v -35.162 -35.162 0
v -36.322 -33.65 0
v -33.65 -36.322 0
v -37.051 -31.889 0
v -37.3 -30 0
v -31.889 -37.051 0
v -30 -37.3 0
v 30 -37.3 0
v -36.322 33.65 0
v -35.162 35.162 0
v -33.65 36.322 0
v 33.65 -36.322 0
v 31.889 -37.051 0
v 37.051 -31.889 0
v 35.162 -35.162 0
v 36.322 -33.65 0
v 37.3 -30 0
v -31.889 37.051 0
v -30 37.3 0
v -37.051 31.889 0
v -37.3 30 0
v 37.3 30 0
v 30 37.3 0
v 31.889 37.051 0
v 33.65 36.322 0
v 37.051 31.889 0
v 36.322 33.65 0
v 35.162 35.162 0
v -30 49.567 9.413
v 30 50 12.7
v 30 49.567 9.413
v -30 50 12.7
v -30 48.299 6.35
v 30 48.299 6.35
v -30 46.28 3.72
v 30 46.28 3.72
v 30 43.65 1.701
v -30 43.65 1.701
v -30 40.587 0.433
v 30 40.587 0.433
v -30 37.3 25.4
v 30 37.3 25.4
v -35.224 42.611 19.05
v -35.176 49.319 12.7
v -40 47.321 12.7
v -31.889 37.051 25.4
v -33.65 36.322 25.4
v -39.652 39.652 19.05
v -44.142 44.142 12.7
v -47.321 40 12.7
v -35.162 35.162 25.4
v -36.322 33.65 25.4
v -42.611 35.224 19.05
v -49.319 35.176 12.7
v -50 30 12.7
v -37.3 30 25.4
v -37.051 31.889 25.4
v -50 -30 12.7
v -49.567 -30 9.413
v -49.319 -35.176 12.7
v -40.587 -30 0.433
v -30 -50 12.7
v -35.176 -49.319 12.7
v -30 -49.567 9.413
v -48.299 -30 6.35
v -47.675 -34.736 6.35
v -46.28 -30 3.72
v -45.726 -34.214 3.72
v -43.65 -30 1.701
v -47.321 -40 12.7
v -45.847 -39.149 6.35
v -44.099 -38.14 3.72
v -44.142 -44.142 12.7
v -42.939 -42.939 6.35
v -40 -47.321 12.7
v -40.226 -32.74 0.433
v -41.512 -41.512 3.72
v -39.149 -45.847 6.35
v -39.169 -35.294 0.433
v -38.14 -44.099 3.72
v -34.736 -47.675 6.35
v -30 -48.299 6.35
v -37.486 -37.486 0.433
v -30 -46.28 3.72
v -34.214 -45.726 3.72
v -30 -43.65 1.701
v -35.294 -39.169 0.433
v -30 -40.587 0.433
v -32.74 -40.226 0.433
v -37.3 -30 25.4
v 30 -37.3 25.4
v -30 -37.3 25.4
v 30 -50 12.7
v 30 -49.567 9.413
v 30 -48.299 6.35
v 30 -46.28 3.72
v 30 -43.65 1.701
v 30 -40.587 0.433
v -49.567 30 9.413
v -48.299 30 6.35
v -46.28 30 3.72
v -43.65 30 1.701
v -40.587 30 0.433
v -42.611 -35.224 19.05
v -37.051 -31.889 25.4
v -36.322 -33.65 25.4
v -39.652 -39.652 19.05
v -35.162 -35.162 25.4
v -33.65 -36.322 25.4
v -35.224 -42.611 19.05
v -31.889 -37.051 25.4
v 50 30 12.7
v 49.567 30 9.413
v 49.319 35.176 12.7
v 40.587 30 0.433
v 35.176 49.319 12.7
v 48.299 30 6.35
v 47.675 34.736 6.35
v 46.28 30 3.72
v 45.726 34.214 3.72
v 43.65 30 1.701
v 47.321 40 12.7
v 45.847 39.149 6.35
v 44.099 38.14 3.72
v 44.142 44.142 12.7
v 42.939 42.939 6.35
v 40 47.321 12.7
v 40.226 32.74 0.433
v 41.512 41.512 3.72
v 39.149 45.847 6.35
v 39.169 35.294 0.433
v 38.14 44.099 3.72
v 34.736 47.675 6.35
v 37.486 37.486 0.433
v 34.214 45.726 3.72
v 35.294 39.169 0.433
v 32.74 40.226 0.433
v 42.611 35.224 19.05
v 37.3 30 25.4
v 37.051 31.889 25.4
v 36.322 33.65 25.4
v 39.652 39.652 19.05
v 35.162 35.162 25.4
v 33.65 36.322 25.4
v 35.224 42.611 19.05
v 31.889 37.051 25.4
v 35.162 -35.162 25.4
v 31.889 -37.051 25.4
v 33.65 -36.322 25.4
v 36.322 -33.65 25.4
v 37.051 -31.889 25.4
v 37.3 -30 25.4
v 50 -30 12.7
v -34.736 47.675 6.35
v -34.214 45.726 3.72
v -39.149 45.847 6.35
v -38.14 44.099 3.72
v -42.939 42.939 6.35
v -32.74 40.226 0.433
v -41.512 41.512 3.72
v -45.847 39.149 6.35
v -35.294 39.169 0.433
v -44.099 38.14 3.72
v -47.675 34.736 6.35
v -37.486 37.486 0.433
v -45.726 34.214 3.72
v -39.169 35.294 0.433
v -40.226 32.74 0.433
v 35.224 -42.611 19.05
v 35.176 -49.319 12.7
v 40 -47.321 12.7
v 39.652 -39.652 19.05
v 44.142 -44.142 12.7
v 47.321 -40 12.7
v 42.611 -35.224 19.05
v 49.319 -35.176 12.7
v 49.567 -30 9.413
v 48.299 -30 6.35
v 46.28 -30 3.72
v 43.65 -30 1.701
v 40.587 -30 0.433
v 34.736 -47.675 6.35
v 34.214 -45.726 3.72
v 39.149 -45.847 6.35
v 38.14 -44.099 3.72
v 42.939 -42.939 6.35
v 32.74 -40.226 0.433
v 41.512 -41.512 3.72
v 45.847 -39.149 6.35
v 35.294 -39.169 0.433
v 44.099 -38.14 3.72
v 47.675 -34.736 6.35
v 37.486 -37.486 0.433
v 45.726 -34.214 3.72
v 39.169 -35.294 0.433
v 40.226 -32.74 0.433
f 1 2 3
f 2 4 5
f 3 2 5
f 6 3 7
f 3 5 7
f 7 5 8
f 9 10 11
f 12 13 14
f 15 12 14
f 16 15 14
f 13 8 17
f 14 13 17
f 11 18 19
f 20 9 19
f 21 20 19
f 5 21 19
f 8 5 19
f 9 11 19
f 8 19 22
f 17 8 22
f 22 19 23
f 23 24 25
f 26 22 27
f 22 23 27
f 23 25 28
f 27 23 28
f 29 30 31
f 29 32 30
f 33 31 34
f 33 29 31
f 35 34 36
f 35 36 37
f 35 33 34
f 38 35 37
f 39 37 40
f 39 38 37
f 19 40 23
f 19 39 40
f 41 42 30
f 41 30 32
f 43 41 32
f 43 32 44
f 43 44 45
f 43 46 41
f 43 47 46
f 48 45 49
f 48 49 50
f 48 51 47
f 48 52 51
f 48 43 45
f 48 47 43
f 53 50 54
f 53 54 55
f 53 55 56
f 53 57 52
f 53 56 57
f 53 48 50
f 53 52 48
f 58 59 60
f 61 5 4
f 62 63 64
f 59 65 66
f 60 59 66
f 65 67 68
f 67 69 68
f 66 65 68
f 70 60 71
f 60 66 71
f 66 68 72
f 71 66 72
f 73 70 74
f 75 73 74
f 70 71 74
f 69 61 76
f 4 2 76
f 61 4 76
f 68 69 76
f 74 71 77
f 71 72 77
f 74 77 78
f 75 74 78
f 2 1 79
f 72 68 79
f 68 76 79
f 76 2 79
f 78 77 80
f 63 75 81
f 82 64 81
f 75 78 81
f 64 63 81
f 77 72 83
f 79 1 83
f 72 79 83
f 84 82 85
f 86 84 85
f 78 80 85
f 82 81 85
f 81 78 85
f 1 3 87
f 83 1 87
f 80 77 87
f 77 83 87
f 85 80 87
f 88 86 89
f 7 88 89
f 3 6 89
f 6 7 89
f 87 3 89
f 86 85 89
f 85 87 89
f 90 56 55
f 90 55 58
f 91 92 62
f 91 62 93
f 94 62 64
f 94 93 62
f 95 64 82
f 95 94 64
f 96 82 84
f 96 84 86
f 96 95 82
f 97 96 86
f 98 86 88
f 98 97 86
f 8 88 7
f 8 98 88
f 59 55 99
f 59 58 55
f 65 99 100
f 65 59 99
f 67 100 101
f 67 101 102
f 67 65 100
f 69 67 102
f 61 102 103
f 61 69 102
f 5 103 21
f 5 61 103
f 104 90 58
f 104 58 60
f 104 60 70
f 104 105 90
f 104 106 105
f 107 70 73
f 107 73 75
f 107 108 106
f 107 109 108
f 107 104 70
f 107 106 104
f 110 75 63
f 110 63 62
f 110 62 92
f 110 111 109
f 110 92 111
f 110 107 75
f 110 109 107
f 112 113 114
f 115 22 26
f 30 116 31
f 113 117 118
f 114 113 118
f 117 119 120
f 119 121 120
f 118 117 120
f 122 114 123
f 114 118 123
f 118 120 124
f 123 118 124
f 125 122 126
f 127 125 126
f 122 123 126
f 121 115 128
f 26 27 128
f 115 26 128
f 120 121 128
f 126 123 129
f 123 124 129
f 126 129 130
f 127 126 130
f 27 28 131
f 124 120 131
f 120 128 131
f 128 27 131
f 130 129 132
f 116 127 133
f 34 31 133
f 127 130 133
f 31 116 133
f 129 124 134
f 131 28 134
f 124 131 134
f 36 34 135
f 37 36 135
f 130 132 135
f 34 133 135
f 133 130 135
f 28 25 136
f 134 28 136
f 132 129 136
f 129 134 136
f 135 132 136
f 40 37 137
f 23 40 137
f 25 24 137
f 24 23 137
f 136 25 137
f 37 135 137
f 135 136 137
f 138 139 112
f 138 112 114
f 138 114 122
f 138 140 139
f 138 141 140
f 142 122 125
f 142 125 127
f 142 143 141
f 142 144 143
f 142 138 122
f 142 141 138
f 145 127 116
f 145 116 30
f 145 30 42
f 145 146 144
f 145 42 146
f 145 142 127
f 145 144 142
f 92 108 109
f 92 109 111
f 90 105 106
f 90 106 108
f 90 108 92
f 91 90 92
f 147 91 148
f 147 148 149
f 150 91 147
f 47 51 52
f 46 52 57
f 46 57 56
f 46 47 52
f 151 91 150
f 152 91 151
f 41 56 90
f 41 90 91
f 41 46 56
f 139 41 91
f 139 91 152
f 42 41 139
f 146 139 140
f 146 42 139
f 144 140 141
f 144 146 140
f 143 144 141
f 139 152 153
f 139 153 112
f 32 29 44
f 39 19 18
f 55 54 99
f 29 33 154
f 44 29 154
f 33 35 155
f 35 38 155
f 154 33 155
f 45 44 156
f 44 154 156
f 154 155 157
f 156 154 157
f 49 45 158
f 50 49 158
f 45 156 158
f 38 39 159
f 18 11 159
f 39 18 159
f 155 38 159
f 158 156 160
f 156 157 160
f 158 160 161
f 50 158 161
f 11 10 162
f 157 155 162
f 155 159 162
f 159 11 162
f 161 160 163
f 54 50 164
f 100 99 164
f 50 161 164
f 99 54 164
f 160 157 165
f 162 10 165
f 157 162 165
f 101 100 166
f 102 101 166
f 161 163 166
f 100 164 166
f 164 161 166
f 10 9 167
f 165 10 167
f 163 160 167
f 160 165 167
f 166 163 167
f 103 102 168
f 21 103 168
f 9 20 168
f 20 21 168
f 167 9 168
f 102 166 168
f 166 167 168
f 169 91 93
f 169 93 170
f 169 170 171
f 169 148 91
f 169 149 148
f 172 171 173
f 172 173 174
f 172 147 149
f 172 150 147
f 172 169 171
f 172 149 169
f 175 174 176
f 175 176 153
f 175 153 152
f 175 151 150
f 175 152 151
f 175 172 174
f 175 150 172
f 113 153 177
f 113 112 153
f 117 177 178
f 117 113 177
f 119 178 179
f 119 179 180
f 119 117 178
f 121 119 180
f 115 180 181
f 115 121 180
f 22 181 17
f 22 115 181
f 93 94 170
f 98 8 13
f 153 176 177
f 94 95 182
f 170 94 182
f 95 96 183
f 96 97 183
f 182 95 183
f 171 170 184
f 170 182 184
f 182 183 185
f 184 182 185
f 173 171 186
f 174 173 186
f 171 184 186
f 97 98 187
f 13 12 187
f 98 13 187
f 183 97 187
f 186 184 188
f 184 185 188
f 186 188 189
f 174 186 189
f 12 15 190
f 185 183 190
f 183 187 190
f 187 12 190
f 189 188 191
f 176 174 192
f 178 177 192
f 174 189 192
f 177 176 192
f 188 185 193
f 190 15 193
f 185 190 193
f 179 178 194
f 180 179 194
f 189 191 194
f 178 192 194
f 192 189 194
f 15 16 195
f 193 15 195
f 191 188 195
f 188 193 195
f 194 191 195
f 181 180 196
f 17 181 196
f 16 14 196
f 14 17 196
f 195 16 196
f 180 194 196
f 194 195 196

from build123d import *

# Parameters (mm, degrees)
F1_DEPTH = 25.4
F2_R     = 12.7
F3_SIZE  = 12.69999


# Not quite as in the source:
# - a fillet or chamfer is up to 0.001 mm smaller than in the source, because OpenCascade refuses the exact size


with BuildPart() as f1:
    # F0 (on Top) → F1 (new body)
    with BuildSketch(Plane.XY):
        with BuildLine():
            ThreePointArc((-50, -30), (-44.1421356237, -44.1421356237), (-30, -50))
            Line((-30, -50), (30, -50))
            ThreePointArc((30, -50), (44.1421356237, -44.1421356237), (50, -30))
            Line((50, -30), (50, 30))
            ThreePointArc((50, 30), (44.1421356237, 44.1421356237), (30, 50))
            Line((30, 50), (-30, 50))
            ThreePointArc((-30, 50), (-44.1421356237, 44.1421356237), (-50, 30))
            Line((-50, 30), (-50, -30))
        make_face()
    extrude(amount=F1_DEPTH)

    # F2
    f2_edges = [f1.edges().sort_by_distance(p)[0] for p in [
        (-44.142136, -44.142136, 0),
        (0, -50, 0),
        (44.142136, -44.142136, 0),
        (50, 0, 0),
        (44.142136, 44.142136, 0),
        (0, 50, 0),
        (-44.142136, 44.142136, 0),
        (-50, 0, 0),
    ]]
    fillet(f2_edges, radius=F2_R)

    # F3 (size 12.7 in the source; OpenCascade refuses exactly that, so slightly less here)
    f3_edges = [f1.edges().sort_by_distance(p)[0] for p in [
        (-44.142136, -44.142136, 25.4),
        (0, -50, 25.4),
        (44.142136, -44.142136, 25.4),
        (50, 0, 25.4),
        (44.142136, 44.142136, 25.4),
        (0, 50, 25.4),
        (-44.142136, 44.142136, 25.4),
        (-50, 0, 25.4),
    ]]
    chamfer(f3_edges, length=F3_SIZE)


solid = f1.part
